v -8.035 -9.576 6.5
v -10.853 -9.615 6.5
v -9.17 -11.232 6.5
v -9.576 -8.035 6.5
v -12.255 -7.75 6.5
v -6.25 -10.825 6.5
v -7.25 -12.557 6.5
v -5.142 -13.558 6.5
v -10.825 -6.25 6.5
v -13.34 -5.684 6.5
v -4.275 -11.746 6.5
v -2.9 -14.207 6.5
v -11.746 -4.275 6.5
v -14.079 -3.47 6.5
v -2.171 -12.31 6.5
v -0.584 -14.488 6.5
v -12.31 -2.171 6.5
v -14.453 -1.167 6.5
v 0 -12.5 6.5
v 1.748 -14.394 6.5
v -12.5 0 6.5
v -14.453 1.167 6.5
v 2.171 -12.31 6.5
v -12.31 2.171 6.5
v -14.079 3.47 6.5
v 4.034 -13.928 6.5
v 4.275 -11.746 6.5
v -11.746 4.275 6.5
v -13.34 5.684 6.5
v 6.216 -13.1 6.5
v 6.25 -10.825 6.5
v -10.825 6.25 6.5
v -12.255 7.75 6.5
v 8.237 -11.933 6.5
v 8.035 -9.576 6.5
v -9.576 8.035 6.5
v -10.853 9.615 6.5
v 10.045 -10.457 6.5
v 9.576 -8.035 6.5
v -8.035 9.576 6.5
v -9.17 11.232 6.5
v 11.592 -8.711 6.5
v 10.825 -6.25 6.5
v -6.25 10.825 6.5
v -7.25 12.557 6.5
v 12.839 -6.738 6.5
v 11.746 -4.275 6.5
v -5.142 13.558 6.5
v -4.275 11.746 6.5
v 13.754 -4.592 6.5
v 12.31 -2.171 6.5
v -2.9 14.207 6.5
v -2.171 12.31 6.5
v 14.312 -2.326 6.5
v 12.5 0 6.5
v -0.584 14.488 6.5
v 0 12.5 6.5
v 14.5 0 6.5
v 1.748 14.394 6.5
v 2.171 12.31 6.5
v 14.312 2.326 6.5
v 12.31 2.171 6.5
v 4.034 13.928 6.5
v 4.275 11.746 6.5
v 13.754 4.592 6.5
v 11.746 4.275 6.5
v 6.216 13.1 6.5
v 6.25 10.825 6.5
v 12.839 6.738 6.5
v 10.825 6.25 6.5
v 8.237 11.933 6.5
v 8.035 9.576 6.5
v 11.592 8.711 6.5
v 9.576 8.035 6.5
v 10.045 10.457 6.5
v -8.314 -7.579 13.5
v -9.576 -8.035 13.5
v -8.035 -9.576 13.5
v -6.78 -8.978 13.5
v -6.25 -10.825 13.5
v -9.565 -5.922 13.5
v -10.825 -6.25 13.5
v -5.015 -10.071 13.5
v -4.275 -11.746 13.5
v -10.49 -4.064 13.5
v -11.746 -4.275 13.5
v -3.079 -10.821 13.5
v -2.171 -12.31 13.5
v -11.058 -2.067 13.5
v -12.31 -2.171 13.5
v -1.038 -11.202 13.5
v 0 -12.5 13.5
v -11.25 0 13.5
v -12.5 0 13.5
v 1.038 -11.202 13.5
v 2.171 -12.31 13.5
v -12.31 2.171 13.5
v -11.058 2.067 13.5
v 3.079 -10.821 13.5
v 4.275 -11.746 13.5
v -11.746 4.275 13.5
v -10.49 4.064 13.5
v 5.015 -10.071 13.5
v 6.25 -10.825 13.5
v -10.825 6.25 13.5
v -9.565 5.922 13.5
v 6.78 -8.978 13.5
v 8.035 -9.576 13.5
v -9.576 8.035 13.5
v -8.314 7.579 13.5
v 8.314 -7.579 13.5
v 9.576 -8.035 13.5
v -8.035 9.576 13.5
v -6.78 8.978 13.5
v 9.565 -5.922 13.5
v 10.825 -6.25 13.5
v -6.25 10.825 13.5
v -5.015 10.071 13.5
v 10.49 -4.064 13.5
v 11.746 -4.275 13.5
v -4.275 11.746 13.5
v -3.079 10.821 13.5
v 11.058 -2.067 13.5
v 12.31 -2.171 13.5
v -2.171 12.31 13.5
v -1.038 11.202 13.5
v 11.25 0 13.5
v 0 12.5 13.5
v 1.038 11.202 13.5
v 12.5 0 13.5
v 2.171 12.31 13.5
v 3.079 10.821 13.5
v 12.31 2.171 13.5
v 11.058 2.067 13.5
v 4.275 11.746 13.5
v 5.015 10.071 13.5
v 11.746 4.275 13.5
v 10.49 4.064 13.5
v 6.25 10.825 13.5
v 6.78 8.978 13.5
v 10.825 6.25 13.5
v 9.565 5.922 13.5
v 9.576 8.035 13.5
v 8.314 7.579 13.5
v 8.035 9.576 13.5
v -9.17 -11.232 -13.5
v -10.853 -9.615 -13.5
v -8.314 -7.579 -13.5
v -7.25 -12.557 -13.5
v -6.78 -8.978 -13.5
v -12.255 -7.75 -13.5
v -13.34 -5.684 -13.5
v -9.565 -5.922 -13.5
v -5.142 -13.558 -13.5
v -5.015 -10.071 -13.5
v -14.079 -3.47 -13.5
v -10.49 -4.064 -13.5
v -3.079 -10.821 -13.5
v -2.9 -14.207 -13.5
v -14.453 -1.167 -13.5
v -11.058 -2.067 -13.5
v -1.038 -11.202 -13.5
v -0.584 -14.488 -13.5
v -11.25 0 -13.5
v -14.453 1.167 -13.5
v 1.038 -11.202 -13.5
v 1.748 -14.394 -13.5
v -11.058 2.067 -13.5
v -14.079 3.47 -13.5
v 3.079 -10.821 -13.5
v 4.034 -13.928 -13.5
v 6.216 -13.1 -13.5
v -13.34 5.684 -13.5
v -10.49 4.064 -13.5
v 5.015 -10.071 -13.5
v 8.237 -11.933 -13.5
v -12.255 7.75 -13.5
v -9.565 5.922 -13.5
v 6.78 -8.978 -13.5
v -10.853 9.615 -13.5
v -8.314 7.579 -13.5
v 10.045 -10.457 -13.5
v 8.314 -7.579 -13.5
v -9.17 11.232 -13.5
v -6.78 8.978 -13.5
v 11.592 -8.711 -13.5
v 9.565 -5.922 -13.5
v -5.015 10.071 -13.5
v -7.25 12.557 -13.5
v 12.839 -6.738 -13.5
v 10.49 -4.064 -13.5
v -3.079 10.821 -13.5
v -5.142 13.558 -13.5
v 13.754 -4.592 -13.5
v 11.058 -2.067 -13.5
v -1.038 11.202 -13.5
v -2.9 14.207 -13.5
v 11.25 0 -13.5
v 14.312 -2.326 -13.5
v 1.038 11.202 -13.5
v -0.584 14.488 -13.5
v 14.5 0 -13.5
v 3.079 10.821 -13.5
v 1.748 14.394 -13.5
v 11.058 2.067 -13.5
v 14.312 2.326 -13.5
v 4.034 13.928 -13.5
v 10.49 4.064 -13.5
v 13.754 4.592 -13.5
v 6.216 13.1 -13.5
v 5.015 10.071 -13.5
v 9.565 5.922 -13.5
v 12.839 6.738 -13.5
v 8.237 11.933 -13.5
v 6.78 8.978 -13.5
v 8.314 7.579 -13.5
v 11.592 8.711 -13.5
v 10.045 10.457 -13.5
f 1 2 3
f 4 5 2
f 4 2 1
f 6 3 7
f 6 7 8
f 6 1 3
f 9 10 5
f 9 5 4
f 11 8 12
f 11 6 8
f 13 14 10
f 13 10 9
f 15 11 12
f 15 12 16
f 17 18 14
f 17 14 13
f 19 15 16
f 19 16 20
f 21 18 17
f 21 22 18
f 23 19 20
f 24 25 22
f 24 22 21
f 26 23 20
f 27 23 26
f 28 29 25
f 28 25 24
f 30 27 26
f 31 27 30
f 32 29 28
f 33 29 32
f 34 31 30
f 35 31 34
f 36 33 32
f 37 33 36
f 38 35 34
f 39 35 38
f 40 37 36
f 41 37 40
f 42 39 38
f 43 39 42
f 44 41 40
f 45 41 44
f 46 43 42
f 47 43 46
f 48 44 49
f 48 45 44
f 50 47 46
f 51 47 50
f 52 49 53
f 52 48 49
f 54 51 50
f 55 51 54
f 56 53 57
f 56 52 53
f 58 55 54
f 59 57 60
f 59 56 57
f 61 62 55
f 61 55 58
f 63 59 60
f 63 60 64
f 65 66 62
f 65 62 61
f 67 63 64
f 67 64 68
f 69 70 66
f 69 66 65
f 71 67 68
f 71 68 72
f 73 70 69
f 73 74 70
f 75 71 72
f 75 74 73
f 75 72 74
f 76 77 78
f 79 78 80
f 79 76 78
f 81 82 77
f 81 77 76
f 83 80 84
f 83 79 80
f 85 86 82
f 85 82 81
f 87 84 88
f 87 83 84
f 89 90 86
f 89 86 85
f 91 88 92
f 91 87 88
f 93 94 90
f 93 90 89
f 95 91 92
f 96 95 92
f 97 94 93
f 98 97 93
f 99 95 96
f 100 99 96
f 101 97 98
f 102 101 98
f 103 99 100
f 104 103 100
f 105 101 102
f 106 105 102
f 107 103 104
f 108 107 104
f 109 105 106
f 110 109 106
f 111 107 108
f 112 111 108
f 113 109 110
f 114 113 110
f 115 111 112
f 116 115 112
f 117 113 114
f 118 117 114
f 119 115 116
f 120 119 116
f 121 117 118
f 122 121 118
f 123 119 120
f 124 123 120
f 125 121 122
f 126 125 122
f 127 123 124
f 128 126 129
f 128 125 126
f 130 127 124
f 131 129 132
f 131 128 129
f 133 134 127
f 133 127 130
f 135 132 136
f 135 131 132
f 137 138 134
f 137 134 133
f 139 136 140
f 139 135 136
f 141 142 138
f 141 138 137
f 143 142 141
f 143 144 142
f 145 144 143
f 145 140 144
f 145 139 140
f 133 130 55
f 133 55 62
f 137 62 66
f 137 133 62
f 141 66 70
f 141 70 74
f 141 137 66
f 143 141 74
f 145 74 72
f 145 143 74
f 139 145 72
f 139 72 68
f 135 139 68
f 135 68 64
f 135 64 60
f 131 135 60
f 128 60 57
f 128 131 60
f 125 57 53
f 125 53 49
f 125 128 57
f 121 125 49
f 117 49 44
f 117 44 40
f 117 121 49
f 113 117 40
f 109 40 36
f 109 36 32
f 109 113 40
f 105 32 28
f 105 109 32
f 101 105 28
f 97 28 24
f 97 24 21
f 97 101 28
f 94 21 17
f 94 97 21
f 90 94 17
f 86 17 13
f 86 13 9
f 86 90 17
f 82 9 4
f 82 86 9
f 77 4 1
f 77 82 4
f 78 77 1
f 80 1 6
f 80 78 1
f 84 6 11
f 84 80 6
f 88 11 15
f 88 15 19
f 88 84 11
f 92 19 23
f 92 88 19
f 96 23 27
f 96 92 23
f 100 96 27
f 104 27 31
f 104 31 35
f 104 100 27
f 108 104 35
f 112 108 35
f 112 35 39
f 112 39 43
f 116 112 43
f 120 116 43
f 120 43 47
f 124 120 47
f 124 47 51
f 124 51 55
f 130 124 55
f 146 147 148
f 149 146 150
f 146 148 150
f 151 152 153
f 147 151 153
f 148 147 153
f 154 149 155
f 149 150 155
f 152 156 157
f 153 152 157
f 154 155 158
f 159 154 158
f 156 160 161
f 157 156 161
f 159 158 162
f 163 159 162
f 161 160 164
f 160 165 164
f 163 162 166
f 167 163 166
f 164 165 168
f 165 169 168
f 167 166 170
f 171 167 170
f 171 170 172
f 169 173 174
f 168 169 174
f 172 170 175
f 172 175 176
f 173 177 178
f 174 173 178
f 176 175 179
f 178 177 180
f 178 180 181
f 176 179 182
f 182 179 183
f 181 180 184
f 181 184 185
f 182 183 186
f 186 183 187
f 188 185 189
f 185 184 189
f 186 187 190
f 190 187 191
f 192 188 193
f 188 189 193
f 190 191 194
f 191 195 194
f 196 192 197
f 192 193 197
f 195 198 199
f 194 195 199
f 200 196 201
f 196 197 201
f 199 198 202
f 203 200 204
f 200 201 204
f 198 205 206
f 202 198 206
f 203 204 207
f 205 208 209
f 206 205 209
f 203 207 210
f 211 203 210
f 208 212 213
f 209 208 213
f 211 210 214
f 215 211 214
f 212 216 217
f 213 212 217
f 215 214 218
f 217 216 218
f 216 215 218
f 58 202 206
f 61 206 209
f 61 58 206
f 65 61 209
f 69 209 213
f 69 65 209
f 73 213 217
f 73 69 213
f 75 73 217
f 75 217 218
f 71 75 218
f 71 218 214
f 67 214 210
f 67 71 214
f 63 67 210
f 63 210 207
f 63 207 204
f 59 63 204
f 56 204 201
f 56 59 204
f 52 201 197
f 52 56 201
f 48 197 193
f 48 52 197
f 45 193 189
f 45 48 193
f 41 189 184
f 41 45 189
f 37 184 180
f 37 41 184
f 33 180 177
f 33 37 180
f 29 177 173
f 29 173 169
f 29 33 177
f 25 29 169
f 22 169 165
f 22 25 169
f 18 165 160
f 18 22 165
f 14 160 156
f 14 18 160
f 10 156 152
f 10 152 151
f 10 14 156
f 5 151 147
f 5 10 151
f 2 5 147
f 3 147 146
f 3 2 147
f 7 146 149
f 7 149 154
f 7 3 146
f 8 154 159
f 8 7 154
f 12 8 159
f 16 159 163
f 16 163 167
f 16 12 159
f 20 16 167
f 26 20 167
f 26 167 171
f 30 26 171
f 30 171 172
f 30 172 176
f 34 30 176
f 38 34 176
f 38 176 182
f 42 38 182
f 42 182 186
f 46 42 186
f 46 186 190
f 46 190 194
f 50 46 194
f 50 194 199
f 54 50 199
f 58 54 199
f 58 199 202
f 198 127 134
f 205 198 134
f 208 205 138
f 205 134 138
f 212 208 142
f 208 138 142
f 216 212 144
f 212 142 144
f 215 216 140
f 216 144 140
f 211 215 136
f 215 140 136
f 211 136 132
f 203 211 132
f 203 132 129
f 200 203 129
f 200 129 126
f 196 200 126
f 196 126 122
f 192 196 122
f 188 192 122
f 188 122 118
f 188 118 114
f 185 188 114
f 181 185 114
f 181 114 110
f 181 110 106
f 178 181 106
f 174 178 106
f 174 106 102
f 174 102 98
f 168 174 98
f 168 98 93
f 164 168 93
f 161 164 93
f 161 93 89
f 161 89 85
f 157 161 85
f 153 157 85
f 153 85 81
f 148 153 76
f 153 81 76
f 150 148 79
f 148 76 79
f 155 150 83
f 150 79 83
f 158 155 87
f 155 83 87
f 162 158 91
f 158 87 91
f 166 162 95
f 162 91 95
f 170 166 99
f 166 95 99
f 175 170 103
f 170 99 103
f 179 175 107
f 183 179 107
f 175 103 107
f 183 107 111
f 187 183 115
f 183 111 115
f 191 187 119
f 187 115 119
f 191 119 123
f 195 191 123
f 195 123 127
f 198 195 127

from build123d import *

# Parameters (mm, degrees)
SKETCH1_R           = 14.5
BOSS_EXTRUDE1_DEPTH = 13.5
SKETCH2_OUTSIDE_W   = 40.82
SKETCH2_OUTSIDE_H   = 40.82
SKETCH2_OUTSIDE_R   = 12.5
CUT_EXTRUDE1_DEPTH  = 7
SKETCH3_R           = 11.25
CUT_EXTRUDE2_DEPTH  = 34.904277016


with BuildPart() as part:
    # Sketch1 → Boss-Extrude1 (new, symmetric)
    with BuildSketch(Plane.XY):
        Circle(SKETCH1_R)
    extrude(amount=BOSS_EXTRUDE1_DEPTH, both=True)

    # Sketch2 outside → Cut-Extrude1 (cut)
    with BuildSketch(Plane.XY.offset(13.5)):
        Rectangle(SKETCH2_OUTSIDE_W, SKETCH2_OUTSIDE_H)
        Circle(SKETCH2_OUTSIDE_R, mode=Mode.SUBTRACT)
    extrude(amount=-CUT_EXTRUDE1_DEPTH, mode=Mode.SUBTRACT)

    # Sketch3 → Cut-Extrude2 (cut, through all)
    with BuildSketch(Plane.XY.offset(13.5)):
        Circle(SKETCH3_R)
    extrude(amount=-CUT_EXTRUDE2_DEPTH, mode=Mode.SUBTRACT)


solid = part.part
